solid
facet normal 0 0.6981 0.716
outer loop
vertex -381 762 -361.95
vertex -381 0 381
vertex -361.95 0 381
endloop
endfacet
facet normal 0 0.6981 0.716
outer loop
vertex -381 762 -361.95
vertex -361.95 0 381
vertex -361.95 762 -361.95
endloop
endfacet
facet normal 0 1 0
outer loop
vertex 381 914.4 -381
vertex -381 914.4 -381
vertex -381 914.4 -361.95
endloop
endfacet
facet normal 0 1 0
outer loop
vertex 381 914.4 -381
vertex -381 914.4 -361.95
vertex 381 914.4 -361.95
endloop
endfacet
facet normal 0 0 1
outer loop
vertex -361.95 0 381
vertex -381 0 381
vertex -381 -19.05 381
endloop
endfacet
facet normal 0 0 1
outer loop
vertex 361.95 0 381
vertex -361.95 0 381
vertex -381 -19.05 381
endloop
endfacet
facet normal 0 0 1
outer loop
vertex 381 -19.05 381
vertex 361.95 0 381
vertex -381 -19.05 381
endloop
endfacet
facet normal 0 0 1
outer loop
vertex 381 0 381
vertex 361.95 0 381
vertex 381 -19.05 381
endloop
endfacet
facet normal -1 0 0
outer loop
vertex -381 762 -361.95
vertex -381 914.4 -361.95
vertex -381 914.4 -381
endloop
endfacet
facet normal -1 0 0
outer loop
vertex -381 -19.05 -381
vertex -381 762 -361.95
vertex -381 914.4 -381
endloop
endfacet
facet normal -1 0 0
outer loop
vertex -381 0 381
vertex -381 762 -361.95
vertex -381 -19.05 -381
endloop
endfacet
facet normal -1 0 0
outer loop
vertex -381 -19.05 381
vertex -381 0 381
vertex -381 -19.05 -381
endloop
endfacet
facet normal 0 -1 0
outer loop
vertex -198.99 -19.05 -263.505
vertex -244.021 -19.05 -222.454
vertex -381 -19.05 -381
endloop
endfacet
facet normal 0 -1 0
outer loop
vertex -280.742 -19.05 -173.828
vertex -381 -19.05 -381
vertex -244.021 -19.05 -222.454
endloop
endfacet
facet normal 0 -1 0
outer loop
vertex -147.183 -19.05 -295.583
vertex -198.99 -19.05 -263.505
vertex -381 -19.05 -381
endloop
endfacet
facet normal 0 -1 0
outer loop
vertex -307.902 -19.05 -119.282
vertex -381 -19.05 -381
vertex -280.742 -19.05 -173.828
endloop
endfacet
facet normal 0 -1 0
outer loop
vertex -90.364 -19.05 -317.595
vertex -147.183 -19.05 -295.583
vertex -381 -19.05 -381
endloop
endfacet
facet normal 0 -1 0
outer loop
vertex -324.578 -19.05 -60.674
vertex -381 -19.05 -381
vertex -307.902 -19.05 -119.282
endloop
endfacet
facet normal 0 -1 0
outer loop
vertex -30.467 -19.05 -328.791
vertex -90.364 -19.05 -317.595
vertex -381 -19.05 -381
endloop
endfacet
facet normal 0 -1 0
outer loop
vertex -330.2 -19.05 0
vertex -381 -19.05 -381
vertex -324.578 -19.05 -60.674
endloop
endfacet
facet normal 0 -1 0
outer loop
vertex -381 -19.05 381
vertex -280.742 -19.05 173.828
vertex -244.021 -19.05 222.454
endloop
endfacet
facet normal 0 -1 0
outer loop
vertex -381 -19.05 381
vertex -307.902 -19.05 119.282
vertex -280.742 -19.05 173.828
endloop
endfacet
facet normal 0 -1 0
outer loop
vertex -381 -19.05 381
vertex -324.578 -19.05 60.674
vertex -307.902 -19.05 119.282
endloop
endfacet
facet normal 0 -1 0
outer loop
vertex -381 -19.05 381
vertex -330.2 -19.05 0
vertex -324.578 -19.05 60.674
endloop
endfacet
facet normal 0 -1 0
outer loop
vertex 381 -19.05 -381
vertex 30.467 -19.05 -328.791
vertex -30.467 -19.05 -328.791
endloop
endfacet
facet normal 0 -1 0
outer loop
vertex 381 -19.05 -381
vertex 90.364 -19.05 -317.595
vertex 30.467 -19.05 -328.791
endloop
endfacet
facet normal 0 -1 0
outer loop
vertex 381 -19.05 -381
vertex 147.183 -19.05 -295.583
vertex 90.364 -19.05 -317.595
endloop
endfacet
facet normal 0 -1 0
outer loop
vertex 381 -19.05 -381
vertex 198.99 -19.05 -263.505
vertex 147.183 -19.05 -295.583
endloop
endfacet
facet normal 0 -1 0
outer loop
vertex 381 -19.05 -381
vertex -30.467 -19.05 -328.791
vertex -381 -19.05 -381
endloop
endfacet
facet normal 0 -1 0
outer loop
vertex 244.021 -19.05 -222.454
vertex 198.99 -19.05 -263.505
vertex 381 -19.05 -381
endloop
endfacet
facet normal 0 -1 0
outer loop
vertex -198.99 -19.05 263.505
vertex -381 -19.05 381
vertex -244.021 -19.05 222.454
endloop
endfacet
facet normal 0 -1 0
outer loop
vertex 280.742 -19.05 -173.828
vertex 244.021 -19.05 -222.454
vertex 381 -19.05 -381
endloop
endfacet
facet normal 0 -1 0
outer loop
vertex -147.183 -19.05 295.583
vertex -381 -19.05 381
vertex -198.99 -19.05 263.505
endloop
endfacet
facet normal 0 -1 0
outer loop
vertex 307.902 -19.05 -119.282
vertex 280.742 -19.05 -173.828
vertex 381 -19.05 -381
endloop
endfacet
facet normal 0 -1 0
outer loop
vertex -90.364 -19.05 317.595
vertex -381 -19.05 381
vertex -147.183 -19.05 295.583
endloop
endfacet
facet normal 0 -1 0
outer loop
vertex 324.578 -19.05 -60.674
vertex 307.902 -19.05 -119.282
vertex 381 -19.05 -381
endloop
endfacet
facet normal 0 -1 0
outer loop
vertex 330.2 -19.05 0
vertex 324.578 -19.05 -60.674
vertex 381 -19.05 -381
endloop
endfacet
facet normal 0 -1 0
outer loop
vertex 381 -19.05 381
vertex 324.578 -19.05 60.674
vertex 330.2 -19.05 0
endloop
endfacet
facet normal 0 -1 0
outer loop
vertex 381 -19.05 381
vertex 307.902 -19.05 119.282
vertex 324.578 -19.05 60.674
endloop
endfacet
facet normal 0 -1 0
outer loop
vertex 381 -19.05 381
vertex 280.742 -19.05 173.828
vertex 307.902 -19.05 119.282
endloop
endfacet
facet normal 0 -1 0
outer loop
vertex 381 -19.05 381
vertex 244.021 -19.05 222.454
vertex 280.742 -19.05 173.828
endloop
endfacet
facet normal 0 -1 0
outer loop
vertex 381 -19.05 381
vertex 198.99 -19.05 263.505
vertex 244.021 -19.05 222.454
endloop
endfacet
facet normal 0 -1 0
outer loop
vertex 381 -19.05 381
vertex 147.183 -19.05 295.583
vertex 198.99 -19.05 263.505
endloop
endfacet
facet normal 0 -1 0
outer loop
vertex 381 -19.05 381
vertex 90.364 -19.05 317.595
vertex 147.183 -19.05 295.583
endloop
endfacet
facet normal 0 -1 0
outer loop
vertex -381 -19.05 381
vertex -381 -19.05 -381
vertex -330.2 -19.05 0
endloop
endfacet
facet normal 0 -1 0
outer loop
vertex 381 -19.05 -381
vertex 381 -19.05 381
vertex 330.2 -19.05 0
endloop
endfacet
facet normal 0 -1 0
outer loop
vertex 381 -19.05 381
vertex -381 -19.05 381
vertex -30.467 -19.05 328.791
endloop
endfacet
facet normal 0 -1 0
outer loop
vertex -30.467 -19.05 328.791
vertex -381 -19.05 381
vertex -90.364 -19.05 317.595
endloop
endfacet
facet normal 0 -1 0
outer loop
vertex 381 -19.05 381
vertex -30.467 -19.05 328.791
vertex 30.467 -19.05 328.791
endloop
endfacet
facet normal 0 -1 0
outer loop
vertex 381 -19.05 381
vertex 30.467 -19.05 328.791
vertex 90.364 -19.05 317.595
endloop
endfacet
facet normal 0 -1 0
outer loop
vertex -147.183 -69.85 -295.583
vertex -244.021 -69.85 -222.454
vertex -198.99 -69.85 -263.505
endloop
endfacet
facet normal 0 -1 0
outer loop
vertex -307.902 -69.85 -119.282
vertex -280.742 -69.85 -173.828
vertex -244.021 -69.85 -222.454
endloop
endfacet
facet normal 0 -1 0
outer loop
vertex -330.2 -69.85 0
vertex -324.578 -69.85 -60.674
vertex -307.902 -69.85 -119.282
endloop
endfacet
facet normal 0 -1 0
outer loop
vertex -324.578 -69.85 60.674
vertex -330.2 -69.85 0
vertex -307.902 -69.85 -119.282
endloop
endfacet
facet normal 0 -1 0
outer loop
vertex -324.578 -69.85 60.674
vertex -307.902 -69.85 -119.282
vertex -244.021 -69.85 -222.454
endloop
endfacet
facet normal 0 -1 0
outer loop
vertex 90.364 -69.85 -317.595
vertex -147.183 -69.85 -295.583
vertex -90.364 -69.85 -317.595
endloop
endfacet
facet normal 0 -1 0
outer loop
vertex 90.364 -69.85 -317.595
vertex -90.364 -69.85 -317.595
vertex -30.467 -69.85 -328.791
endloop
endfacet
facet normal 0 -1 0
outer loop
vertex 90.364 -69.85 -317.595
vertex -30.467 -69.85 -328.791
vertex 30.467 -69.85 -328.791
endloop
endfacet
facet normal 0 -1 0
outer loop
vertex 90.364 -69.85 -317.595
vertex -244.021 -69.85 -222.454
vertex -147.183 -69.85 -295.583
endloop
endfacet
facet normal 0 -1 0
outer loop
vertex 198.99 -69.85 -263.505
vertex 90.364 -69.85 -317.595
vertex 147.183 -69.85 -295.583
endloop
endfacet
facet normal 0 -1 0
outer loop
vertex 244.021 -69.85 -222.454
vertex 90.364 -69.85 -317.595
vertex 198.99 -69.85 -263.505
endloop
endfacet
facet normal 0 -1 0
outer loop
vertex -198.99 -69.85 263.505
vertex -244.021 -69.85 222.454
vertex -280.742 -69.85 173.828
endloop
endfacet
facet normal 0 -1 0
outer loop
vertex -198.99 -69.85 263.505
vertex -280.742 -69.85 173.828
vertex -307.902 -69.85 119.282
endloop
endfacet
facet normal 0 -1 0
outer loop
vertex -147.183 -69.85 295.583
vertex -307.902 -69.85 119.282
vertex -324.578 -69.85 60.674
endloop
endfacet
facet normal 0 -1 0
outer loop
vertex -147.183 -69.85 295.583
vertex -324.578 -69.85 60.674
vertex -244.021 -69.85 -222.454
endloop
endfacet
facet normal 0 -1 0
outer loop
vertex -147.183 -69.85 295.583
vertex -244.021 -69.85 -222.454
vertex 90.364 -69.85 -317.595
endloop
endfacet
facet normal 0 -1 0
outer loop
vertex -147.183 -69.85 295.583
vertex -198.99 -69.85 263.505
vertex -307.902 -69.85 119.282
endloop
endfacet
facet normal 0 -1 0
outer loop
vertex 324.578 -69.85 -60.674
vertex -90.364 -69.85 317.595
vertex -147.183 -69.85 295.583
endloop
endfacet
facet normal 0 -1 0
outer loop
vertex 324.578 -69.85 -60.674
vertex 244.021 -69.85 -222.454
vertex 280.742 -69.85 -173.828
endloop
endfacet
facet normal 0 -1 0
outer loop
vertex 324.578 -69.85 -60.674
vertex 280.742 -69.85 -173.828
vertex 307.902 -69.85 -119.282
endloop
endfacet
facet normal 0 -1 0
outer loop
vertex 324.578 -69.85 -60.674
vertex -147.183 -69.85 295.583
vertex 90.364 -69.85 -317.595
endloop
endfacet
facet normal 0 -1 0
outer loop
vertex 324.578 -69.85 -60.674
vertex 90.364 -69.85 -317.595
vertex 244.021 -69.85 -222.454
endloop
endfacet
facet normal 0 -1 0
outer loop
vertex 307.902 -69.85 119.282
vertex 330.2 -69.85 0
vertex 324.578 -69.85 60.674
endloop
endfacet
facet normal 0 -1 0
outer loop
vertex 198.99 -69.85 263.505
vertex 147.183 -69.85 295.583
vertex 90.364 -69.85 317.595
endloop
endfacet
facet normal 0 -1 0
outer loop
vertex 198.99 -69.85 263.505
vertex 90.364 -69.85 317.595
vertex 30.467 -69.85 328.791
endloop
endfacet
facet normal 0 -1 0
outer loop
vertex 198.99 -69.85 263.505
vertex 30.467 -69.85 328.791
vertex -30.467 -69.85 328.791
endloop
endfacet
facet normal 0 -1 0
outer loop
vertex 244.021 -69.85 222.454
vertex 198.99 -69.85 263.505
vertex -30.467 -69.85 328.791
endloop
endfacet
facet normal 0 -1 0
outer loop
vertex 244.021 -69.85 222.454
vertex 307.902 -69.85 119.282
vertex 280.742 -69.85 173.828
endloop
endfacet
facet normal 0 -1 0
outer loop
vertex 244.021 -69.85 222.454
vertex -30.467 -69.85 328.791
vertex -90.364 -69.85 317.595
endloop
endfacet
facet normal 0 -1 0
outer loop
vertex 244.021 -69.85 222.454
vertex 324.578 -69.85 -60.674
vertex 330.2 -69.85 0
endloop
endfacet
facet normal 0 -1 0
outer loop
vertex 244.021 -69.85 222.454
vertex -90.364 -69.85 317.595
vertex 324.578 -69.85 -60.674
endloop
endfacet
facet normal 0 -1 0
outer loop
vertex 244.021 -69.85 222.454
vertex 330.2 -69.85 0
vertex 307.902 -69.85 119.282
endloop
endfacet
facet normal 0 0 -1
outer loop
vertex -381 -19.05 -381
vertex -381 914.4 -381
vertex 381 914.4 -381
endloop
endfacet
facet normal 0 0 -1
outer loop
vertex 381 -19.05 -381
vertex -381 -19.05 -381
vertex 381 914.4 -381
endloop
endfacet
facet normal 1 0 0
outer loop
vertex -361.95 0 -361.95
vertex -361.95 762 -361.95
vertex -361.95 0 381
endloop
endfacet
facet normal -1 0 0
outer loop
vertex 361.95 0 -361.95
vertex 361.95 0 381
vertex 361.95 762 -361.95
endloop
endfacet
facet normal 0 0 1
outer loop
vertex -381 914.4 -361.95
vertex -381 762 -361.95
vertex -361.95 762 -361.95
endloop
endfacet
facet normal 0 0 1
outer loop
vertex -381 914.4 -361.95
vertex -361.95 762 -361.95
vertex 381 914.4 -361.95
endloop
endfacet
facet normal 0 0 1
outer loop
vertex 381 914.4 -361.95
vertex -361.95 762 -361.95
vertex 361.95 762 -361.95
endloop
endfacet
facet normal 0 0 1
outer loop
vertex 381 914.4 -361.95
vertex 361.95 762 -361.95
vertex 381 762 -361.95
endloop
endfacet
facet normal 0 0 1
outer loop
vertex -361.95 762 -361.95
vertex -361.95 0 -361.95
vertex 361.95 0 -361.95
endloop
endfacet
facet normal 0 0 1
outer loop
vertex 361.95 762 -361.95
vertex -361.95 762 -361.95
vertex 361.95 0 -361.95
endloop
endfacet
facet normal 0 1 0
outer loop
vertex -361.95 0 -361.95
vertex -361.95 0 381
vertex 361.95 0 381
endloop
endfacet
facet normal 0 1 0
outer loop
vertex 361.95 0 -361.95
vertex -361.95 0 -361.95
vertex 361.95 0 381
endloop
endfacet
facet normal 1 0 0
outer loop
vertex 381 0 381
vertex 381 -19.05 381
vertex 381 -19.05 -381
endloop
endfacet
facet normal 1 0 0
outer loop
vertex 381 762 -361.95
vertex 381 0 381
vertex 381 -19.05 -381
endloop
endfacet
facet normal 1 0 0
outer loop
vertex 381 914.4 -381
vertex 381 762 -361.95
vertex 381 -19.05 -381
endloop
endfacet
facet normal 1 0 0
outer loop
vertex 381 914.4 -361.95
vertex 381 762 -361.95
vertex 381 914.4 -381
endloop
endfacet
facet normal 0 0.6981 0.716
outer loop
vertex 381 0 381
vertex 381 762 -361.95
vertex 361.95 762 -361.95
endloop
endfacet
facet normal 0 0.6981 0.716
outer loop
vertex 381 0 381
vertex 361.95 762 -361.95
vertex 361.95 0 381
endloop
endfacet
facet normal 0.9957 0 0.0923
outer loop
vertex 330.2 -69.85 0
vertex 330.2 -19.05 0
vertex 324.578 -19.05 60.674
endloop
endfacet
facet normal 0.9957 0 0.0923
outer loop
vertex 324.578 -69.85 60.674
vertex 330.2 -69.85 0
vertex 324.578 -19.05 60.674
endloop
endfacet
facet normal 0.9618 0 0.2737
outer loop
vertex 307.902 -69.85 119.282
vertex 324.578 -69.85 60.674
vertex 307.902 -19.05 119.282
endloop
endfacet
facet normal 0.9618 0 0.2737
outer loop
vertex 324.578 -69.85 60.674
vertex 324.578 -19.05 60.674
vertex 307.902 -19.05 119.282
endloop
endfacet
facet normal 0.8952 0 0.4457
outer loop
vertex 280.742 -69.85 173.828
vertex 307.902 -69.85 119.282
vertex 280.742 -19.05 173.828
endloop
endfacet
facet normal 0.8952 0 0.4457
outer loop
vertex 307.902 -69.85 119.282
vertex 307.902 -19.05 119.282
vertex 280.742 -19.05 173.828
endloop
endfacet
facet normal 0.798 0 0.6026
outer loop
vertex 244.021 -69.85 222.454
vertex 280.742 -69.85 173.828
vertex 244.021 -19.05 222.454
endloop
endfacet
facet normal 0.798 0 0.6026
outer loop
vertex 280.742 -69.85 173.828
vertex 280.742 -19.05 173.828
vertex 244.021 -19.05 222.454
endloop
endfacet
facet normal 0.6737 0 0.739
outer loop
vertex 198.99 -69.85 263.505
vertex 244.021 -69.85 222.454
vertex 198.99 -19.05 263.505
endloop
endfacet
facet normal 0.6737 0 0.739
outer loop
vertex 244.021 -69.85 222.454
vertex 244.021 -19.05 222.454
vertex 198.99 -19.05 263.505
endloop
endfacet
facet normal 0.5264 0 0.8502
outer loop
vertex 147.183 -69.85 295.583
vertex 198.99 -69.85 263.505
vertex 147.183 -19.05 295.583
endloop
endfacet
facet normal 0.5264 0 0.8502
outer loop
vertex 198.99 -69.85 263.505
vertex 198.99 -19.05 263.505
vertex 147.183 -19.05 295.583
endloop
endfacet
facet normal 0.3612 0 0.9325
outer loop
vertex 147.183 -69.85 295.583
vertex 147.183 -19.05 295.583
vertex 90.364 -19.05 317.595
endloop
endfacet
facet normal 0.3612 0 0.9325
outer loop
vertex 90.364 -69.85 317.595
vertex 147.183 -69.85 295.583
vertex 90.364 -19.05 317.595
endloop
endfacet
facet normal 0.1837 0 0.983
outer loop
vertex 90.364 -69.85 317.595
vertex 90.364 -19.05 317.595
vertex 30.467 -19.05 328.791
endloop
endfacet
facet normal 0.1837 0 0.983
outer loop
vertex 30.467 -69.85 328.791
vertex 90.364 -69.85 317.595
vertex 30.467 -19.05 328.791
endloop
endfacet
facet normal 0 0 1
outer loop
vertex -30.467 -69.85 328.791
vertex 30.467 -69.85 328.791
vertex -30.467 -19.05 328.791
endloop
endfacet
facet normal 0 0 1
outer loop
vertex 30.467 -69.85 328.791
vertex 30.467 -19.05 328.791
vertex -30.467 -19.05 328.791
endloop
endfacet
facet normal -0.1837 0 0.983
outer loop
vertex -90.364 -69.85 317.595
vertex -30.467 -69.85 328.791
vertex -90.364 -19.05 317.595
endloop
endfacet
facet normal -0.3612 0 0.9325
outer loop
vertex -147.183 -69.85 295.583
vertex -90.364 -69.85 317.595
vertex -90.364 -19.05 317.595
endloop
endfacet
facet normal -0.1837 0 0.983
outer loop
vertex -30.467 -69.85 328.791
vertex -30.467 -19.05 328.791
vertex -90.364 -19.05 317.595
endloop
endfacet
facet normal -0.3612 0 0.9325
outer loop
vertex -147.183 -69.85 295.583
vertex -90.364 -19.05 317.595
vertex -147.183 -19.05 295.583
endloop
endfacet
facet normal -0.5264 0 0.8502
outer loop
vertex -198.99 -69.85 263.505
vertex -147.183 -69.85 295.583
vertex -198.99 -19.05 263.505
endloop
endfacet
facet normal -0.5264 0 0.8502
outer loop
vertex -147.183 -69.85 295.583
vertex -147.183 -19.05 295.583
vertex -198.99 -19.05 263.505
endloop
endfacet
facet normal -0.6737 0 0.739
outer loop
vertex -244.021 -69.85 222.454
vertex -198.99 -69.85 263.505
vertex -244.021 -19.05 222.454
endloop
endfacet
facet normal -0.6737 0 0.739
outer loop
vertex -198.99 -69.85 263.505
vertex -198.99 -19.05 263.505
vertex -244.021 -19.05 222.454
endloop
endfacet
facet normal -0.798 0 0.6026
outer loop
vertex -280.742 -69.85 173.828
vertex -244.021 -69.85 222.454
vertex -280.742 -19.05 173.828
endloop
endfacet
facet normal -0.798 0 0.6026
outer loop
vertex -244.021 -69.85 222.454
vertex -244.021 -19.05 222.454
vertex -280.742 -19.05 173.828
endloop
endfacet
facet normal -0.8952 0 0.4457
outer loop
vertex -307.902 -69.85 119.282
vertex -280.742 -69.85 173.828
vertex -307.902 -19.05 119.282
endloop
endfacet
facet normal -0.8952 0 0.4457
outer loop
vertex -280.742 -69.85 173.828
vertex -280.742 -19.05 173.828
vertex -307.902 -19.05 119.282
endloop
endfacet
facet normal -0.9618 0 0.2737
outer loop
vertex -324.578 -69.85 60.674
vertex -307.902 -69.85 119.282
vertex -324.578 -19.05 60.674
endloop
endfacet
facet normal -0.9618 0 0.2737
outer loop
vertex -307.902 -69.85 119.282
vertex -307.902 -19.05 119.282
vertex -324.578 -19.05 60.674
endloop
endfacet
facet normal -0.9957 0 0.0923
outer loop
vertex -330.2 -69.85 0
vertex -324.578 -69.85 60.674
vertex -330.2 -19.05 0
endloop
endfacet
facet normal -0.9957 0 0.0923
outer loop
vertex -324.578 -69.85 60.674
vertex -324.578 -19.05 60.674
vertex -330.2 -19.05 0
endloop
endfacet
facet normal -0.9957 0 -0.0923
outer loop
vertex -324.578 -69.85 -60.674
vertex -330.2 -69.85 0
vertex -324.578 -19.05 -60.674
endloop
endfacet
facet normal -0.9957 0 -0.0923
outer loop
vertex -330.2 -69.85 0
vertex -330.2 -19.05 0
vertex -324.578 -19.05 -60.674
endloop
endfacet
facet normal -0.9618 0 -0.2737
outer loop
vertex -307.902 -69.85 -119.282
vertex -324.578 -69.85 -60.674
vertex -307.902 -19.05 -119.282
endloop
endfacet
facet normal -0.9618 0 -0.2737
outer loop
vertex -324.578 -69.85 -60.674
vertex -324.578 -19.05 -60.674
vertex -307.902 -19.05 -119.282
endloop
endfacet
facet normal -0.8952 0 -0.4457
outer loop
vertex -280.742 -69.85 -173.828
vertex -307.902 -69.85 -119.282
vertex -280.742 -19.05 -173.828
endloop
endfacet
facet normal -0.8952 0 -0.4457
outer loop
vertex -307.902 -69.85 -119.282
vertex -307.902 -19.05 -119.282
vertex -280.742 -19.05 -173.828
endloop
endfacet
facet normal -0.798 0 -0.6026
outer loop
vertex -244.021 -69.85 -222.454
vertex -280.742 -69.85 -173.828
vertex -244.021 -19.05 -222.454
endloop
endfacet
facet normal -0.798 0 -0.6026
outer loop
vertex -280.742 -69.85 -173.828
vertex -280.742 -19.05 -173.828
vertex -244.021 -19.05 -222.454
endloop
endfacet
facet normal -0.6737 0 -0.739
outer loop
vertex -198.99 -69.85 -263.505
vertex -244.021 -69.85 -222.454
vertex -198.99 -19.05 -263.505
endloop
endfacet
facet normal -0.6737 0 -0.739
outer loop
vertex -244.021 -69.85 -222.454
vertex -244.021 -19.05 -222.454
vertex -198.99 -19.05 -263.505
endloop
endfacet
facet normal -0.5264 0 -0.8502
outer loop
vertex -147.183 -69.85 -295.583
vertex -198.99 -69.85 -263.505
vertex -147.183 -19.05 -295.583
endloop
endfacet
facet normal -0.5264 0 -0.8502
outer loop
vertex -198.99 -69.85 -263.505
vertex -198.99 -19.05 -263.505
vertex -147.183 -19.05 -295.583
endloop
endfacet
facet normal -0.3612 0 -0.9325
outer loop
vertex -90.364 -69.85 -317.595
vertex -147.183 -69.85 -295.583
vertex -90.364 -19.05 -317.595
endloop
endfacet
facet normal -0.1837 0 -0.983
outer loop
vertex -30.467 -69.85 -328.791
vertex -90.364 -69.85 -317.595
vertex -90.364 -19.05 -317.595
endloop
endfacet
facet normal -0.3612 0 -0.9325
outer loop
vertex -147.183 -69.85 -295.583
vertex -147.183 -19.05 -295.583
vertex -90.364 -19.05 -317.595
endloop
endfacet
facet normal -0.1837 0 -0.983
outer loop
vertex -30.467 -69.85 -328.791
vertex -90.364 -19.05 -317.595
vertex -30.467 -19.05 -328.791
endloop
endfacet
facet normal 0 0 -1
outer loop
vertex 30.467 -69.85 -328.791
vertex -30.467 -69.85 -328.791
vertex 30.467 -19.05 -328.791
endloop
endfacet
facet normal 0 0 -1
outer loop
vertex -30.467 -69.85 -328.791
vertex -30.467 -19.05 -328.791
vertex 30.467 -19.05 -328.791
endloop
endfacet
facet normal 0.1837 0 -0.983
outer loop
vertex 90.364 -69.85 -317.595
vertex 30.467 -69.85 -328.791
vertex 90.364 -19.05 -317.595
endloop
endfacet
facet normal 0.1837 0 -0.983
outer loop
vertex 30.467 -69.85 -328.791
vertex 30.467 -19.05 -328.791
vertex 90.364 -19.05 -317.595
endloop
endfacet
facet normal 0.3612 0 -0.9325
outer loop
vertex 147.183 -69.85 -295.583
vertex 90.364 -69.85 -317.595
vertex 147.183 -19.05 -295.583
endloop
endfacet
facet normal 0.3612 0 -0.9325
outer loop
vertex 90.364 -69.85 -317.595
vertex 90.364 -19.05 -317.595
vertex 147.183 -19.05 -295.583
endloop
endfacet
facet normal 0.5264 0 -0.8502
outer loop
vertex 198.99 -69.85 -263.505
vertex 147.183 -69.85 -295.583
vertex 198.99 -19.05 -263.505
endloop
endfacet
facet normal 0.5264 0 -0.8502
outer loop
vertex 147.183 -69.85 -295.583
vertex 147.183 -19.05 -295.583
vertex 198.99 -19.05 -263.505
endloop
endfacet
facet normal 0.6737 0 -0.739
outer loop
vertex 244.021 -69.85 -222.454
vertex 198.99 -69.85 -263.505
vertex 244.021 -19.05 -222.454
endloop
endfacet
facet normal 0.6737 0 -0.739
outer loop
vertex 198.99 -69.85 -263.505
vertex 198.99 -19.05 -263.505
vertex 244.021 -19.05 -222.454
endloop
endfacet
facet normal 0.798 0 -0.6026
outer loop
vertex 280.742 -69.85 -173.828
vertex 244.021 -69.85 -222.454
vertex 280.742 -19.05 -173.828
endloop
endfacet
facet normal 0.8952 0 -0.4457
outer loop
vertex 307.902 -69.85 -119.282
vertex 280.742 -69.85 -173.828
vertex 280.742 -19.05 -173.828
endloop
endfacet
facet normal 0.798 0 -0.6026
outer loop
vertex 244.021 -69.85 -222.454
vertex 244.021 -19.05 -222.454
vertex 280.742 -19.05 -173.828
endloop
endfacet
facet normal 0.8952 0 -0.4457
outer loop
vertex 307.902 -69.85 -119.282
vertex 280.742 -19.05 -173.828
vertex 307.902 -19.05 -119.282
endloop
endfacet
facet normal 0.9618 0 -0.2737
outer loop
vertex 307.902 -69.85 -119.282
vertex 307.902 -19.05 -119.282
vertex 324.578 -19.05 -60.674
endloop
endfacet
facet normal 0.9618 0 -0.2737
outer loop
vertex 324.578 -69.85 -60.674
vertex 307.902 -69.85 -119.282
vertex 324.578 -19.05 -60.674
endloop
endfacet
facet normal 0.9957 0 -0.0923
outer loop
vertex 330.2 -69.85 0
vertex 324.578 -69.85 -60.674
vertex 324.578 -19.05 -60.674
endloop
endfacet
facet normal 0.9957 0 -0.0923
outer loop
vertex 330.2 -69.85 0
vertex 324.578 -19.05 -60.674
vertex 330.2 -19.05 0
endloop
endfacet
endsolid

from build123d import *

# Parameters (mm, degrees)
F0_W     = 762
F0_H     = 762
F1_DEPTH = 19.05
F2_W     = 762
F2_H     = 914.4
F3_DEPTH = 19.05
F5_DEPTH = 19.05
F7_DEPTH = 19.05
F8_R     = 330.2
F9_DEPTH = 50.8


with BuildPart() as f1:
    # F0 (on Front) → F1 (new body)
    with BuildSketch(Plane.XZ):
        Rectangle(F0_W, F0_H)
    extrude(amount=F1_DEPTH)

    # F2 (on face) → F3 (join)
    with BuildSketch(Plane(origin=(0, 0, -381), x_dir=(1, 0, 0), z_dir=(0, 0, -1))):
        with Locations((0, -457.2)):
            Rectangle(F2_W, F2_H)
    extrude(amount=-F3_DEPTH)

    # F4 (on face) → F5 (join)
    with BuildSketch(Plane(origin=(-381, 0, 0), x_dir=(0, -1, 0), z_dir=(-1, 0, 0))):
        Polygon((0, 273.05), (0, 381), (-762, -361.95), (-635, -361.95), (0, 257.175), align=None)
        Polygon((0, -361.95), (0, 257.175), (-635, -361.95), align=None)
    extrude(amount=-F5_DEPTH)

    # F6 (on face) → F7 (join)
    with BuildSketch(Plane.YZ.offset(381)):
        Polygon((0, 381), (0, -361.95), (762, -361.95), align=None)
    extrude(amount=-F7_DEPTH)

    # F8 (on face) → F9 (join)
    with BuildSketch(Plane.XZ.offset(19.05)):
        Circle(F8_R)
    extrude(amount=F9_DEPTH)


solid = f1.part
